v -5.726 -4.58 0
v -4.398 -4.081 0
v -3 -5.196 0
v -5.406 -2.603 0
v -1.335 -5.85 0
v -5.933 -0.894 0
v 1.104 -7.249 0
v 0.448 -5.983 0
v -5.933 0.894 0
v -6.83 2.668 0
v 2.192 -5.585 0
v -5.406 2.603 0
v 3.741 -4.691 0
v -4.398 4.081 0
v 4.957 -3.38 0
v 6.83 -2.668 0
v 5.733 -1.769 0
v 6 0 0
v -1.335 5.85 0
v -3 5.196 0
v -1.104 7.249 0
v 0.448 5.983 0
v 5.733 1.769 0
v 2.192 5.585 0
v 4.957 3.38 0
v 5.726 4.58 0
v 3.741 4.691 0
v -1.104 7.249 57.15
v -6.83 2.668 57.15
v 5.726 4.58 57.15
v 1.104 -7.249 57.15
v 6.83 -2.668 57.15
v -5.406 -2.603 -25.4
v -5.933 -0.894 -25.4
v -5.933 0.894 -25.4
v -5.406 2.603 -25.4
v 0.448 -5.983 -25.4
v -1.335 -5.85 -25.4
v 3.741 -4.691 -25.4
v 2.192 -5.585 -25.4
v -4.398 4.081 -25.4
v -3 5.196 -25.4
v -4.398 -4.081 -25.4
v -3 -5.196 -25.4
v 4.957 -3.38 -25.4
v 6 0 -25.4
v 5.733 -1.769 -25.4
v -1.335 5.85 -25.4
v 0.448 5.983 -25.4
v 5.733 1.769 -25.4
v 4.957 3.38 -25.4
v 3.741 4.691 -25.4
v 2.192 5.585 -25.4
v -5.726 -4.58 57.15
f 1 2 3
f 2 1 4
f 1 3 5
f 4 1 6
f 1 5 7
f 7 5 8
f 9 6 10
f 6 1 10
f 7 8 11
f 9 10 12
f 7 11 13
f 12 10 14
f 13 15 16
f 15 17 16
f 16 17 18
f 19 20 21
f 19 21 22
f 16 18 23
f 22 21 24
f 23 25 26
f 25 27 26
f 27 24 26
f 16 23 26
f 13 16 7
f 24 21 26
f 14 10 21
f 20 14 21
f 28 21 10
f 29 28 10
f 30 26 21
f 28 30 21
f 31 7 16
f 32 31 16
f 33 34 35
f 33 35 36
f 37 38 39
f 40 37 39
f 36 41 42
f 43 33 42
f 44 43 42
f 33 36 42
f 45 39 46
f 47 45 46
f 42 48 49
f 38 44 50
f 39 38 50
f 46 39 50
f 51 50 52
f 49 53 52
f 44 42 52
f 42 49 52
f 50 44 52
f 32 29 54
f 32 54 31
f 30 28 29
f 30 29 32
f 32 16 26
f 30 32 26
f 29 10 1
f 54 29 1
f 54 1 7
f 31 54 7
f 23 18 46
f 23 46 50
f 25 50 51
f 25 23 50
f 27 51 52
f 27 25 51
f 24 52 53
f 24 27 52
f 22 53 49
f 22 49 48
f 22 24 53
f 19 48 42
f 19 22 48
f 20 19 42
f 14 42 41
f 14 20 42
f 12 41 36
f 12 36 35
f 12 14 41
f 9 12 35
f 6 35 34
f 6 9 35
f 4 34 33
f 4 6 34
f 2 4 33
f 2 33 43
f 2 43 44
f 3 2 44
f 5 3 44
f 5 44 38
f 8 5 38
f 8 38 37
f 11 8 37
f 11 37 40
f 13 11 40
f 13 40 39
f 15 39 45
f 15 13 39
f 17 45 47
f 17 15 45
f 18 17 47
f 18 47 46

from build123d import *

# Parameters (mm, degrees)
F1_DEPTH = 57.15
F2_R     = 6
F3_DEPTH = 25.4


with BuildPart() as f1:
    # F0 (on Top) → F1 (new body)
    with BuildSketch(Plane.XY):
        Polygon((1.104013, -7.248758), (6.829615, -2.668275), (5.725602, 4.580482), (-1.104013, 7.248758), (-6.829615, 2.668275), (-5.725602, -4.580482), align=None)
    extrude(amount=F1_DEPTH)

    # F2 (on Top) → F3 (join)
    with BuildSketch(Plane.XY):
        Circle(F2_R)
    extrude(amount=-F3_DEPTH)


solid = f1.part
